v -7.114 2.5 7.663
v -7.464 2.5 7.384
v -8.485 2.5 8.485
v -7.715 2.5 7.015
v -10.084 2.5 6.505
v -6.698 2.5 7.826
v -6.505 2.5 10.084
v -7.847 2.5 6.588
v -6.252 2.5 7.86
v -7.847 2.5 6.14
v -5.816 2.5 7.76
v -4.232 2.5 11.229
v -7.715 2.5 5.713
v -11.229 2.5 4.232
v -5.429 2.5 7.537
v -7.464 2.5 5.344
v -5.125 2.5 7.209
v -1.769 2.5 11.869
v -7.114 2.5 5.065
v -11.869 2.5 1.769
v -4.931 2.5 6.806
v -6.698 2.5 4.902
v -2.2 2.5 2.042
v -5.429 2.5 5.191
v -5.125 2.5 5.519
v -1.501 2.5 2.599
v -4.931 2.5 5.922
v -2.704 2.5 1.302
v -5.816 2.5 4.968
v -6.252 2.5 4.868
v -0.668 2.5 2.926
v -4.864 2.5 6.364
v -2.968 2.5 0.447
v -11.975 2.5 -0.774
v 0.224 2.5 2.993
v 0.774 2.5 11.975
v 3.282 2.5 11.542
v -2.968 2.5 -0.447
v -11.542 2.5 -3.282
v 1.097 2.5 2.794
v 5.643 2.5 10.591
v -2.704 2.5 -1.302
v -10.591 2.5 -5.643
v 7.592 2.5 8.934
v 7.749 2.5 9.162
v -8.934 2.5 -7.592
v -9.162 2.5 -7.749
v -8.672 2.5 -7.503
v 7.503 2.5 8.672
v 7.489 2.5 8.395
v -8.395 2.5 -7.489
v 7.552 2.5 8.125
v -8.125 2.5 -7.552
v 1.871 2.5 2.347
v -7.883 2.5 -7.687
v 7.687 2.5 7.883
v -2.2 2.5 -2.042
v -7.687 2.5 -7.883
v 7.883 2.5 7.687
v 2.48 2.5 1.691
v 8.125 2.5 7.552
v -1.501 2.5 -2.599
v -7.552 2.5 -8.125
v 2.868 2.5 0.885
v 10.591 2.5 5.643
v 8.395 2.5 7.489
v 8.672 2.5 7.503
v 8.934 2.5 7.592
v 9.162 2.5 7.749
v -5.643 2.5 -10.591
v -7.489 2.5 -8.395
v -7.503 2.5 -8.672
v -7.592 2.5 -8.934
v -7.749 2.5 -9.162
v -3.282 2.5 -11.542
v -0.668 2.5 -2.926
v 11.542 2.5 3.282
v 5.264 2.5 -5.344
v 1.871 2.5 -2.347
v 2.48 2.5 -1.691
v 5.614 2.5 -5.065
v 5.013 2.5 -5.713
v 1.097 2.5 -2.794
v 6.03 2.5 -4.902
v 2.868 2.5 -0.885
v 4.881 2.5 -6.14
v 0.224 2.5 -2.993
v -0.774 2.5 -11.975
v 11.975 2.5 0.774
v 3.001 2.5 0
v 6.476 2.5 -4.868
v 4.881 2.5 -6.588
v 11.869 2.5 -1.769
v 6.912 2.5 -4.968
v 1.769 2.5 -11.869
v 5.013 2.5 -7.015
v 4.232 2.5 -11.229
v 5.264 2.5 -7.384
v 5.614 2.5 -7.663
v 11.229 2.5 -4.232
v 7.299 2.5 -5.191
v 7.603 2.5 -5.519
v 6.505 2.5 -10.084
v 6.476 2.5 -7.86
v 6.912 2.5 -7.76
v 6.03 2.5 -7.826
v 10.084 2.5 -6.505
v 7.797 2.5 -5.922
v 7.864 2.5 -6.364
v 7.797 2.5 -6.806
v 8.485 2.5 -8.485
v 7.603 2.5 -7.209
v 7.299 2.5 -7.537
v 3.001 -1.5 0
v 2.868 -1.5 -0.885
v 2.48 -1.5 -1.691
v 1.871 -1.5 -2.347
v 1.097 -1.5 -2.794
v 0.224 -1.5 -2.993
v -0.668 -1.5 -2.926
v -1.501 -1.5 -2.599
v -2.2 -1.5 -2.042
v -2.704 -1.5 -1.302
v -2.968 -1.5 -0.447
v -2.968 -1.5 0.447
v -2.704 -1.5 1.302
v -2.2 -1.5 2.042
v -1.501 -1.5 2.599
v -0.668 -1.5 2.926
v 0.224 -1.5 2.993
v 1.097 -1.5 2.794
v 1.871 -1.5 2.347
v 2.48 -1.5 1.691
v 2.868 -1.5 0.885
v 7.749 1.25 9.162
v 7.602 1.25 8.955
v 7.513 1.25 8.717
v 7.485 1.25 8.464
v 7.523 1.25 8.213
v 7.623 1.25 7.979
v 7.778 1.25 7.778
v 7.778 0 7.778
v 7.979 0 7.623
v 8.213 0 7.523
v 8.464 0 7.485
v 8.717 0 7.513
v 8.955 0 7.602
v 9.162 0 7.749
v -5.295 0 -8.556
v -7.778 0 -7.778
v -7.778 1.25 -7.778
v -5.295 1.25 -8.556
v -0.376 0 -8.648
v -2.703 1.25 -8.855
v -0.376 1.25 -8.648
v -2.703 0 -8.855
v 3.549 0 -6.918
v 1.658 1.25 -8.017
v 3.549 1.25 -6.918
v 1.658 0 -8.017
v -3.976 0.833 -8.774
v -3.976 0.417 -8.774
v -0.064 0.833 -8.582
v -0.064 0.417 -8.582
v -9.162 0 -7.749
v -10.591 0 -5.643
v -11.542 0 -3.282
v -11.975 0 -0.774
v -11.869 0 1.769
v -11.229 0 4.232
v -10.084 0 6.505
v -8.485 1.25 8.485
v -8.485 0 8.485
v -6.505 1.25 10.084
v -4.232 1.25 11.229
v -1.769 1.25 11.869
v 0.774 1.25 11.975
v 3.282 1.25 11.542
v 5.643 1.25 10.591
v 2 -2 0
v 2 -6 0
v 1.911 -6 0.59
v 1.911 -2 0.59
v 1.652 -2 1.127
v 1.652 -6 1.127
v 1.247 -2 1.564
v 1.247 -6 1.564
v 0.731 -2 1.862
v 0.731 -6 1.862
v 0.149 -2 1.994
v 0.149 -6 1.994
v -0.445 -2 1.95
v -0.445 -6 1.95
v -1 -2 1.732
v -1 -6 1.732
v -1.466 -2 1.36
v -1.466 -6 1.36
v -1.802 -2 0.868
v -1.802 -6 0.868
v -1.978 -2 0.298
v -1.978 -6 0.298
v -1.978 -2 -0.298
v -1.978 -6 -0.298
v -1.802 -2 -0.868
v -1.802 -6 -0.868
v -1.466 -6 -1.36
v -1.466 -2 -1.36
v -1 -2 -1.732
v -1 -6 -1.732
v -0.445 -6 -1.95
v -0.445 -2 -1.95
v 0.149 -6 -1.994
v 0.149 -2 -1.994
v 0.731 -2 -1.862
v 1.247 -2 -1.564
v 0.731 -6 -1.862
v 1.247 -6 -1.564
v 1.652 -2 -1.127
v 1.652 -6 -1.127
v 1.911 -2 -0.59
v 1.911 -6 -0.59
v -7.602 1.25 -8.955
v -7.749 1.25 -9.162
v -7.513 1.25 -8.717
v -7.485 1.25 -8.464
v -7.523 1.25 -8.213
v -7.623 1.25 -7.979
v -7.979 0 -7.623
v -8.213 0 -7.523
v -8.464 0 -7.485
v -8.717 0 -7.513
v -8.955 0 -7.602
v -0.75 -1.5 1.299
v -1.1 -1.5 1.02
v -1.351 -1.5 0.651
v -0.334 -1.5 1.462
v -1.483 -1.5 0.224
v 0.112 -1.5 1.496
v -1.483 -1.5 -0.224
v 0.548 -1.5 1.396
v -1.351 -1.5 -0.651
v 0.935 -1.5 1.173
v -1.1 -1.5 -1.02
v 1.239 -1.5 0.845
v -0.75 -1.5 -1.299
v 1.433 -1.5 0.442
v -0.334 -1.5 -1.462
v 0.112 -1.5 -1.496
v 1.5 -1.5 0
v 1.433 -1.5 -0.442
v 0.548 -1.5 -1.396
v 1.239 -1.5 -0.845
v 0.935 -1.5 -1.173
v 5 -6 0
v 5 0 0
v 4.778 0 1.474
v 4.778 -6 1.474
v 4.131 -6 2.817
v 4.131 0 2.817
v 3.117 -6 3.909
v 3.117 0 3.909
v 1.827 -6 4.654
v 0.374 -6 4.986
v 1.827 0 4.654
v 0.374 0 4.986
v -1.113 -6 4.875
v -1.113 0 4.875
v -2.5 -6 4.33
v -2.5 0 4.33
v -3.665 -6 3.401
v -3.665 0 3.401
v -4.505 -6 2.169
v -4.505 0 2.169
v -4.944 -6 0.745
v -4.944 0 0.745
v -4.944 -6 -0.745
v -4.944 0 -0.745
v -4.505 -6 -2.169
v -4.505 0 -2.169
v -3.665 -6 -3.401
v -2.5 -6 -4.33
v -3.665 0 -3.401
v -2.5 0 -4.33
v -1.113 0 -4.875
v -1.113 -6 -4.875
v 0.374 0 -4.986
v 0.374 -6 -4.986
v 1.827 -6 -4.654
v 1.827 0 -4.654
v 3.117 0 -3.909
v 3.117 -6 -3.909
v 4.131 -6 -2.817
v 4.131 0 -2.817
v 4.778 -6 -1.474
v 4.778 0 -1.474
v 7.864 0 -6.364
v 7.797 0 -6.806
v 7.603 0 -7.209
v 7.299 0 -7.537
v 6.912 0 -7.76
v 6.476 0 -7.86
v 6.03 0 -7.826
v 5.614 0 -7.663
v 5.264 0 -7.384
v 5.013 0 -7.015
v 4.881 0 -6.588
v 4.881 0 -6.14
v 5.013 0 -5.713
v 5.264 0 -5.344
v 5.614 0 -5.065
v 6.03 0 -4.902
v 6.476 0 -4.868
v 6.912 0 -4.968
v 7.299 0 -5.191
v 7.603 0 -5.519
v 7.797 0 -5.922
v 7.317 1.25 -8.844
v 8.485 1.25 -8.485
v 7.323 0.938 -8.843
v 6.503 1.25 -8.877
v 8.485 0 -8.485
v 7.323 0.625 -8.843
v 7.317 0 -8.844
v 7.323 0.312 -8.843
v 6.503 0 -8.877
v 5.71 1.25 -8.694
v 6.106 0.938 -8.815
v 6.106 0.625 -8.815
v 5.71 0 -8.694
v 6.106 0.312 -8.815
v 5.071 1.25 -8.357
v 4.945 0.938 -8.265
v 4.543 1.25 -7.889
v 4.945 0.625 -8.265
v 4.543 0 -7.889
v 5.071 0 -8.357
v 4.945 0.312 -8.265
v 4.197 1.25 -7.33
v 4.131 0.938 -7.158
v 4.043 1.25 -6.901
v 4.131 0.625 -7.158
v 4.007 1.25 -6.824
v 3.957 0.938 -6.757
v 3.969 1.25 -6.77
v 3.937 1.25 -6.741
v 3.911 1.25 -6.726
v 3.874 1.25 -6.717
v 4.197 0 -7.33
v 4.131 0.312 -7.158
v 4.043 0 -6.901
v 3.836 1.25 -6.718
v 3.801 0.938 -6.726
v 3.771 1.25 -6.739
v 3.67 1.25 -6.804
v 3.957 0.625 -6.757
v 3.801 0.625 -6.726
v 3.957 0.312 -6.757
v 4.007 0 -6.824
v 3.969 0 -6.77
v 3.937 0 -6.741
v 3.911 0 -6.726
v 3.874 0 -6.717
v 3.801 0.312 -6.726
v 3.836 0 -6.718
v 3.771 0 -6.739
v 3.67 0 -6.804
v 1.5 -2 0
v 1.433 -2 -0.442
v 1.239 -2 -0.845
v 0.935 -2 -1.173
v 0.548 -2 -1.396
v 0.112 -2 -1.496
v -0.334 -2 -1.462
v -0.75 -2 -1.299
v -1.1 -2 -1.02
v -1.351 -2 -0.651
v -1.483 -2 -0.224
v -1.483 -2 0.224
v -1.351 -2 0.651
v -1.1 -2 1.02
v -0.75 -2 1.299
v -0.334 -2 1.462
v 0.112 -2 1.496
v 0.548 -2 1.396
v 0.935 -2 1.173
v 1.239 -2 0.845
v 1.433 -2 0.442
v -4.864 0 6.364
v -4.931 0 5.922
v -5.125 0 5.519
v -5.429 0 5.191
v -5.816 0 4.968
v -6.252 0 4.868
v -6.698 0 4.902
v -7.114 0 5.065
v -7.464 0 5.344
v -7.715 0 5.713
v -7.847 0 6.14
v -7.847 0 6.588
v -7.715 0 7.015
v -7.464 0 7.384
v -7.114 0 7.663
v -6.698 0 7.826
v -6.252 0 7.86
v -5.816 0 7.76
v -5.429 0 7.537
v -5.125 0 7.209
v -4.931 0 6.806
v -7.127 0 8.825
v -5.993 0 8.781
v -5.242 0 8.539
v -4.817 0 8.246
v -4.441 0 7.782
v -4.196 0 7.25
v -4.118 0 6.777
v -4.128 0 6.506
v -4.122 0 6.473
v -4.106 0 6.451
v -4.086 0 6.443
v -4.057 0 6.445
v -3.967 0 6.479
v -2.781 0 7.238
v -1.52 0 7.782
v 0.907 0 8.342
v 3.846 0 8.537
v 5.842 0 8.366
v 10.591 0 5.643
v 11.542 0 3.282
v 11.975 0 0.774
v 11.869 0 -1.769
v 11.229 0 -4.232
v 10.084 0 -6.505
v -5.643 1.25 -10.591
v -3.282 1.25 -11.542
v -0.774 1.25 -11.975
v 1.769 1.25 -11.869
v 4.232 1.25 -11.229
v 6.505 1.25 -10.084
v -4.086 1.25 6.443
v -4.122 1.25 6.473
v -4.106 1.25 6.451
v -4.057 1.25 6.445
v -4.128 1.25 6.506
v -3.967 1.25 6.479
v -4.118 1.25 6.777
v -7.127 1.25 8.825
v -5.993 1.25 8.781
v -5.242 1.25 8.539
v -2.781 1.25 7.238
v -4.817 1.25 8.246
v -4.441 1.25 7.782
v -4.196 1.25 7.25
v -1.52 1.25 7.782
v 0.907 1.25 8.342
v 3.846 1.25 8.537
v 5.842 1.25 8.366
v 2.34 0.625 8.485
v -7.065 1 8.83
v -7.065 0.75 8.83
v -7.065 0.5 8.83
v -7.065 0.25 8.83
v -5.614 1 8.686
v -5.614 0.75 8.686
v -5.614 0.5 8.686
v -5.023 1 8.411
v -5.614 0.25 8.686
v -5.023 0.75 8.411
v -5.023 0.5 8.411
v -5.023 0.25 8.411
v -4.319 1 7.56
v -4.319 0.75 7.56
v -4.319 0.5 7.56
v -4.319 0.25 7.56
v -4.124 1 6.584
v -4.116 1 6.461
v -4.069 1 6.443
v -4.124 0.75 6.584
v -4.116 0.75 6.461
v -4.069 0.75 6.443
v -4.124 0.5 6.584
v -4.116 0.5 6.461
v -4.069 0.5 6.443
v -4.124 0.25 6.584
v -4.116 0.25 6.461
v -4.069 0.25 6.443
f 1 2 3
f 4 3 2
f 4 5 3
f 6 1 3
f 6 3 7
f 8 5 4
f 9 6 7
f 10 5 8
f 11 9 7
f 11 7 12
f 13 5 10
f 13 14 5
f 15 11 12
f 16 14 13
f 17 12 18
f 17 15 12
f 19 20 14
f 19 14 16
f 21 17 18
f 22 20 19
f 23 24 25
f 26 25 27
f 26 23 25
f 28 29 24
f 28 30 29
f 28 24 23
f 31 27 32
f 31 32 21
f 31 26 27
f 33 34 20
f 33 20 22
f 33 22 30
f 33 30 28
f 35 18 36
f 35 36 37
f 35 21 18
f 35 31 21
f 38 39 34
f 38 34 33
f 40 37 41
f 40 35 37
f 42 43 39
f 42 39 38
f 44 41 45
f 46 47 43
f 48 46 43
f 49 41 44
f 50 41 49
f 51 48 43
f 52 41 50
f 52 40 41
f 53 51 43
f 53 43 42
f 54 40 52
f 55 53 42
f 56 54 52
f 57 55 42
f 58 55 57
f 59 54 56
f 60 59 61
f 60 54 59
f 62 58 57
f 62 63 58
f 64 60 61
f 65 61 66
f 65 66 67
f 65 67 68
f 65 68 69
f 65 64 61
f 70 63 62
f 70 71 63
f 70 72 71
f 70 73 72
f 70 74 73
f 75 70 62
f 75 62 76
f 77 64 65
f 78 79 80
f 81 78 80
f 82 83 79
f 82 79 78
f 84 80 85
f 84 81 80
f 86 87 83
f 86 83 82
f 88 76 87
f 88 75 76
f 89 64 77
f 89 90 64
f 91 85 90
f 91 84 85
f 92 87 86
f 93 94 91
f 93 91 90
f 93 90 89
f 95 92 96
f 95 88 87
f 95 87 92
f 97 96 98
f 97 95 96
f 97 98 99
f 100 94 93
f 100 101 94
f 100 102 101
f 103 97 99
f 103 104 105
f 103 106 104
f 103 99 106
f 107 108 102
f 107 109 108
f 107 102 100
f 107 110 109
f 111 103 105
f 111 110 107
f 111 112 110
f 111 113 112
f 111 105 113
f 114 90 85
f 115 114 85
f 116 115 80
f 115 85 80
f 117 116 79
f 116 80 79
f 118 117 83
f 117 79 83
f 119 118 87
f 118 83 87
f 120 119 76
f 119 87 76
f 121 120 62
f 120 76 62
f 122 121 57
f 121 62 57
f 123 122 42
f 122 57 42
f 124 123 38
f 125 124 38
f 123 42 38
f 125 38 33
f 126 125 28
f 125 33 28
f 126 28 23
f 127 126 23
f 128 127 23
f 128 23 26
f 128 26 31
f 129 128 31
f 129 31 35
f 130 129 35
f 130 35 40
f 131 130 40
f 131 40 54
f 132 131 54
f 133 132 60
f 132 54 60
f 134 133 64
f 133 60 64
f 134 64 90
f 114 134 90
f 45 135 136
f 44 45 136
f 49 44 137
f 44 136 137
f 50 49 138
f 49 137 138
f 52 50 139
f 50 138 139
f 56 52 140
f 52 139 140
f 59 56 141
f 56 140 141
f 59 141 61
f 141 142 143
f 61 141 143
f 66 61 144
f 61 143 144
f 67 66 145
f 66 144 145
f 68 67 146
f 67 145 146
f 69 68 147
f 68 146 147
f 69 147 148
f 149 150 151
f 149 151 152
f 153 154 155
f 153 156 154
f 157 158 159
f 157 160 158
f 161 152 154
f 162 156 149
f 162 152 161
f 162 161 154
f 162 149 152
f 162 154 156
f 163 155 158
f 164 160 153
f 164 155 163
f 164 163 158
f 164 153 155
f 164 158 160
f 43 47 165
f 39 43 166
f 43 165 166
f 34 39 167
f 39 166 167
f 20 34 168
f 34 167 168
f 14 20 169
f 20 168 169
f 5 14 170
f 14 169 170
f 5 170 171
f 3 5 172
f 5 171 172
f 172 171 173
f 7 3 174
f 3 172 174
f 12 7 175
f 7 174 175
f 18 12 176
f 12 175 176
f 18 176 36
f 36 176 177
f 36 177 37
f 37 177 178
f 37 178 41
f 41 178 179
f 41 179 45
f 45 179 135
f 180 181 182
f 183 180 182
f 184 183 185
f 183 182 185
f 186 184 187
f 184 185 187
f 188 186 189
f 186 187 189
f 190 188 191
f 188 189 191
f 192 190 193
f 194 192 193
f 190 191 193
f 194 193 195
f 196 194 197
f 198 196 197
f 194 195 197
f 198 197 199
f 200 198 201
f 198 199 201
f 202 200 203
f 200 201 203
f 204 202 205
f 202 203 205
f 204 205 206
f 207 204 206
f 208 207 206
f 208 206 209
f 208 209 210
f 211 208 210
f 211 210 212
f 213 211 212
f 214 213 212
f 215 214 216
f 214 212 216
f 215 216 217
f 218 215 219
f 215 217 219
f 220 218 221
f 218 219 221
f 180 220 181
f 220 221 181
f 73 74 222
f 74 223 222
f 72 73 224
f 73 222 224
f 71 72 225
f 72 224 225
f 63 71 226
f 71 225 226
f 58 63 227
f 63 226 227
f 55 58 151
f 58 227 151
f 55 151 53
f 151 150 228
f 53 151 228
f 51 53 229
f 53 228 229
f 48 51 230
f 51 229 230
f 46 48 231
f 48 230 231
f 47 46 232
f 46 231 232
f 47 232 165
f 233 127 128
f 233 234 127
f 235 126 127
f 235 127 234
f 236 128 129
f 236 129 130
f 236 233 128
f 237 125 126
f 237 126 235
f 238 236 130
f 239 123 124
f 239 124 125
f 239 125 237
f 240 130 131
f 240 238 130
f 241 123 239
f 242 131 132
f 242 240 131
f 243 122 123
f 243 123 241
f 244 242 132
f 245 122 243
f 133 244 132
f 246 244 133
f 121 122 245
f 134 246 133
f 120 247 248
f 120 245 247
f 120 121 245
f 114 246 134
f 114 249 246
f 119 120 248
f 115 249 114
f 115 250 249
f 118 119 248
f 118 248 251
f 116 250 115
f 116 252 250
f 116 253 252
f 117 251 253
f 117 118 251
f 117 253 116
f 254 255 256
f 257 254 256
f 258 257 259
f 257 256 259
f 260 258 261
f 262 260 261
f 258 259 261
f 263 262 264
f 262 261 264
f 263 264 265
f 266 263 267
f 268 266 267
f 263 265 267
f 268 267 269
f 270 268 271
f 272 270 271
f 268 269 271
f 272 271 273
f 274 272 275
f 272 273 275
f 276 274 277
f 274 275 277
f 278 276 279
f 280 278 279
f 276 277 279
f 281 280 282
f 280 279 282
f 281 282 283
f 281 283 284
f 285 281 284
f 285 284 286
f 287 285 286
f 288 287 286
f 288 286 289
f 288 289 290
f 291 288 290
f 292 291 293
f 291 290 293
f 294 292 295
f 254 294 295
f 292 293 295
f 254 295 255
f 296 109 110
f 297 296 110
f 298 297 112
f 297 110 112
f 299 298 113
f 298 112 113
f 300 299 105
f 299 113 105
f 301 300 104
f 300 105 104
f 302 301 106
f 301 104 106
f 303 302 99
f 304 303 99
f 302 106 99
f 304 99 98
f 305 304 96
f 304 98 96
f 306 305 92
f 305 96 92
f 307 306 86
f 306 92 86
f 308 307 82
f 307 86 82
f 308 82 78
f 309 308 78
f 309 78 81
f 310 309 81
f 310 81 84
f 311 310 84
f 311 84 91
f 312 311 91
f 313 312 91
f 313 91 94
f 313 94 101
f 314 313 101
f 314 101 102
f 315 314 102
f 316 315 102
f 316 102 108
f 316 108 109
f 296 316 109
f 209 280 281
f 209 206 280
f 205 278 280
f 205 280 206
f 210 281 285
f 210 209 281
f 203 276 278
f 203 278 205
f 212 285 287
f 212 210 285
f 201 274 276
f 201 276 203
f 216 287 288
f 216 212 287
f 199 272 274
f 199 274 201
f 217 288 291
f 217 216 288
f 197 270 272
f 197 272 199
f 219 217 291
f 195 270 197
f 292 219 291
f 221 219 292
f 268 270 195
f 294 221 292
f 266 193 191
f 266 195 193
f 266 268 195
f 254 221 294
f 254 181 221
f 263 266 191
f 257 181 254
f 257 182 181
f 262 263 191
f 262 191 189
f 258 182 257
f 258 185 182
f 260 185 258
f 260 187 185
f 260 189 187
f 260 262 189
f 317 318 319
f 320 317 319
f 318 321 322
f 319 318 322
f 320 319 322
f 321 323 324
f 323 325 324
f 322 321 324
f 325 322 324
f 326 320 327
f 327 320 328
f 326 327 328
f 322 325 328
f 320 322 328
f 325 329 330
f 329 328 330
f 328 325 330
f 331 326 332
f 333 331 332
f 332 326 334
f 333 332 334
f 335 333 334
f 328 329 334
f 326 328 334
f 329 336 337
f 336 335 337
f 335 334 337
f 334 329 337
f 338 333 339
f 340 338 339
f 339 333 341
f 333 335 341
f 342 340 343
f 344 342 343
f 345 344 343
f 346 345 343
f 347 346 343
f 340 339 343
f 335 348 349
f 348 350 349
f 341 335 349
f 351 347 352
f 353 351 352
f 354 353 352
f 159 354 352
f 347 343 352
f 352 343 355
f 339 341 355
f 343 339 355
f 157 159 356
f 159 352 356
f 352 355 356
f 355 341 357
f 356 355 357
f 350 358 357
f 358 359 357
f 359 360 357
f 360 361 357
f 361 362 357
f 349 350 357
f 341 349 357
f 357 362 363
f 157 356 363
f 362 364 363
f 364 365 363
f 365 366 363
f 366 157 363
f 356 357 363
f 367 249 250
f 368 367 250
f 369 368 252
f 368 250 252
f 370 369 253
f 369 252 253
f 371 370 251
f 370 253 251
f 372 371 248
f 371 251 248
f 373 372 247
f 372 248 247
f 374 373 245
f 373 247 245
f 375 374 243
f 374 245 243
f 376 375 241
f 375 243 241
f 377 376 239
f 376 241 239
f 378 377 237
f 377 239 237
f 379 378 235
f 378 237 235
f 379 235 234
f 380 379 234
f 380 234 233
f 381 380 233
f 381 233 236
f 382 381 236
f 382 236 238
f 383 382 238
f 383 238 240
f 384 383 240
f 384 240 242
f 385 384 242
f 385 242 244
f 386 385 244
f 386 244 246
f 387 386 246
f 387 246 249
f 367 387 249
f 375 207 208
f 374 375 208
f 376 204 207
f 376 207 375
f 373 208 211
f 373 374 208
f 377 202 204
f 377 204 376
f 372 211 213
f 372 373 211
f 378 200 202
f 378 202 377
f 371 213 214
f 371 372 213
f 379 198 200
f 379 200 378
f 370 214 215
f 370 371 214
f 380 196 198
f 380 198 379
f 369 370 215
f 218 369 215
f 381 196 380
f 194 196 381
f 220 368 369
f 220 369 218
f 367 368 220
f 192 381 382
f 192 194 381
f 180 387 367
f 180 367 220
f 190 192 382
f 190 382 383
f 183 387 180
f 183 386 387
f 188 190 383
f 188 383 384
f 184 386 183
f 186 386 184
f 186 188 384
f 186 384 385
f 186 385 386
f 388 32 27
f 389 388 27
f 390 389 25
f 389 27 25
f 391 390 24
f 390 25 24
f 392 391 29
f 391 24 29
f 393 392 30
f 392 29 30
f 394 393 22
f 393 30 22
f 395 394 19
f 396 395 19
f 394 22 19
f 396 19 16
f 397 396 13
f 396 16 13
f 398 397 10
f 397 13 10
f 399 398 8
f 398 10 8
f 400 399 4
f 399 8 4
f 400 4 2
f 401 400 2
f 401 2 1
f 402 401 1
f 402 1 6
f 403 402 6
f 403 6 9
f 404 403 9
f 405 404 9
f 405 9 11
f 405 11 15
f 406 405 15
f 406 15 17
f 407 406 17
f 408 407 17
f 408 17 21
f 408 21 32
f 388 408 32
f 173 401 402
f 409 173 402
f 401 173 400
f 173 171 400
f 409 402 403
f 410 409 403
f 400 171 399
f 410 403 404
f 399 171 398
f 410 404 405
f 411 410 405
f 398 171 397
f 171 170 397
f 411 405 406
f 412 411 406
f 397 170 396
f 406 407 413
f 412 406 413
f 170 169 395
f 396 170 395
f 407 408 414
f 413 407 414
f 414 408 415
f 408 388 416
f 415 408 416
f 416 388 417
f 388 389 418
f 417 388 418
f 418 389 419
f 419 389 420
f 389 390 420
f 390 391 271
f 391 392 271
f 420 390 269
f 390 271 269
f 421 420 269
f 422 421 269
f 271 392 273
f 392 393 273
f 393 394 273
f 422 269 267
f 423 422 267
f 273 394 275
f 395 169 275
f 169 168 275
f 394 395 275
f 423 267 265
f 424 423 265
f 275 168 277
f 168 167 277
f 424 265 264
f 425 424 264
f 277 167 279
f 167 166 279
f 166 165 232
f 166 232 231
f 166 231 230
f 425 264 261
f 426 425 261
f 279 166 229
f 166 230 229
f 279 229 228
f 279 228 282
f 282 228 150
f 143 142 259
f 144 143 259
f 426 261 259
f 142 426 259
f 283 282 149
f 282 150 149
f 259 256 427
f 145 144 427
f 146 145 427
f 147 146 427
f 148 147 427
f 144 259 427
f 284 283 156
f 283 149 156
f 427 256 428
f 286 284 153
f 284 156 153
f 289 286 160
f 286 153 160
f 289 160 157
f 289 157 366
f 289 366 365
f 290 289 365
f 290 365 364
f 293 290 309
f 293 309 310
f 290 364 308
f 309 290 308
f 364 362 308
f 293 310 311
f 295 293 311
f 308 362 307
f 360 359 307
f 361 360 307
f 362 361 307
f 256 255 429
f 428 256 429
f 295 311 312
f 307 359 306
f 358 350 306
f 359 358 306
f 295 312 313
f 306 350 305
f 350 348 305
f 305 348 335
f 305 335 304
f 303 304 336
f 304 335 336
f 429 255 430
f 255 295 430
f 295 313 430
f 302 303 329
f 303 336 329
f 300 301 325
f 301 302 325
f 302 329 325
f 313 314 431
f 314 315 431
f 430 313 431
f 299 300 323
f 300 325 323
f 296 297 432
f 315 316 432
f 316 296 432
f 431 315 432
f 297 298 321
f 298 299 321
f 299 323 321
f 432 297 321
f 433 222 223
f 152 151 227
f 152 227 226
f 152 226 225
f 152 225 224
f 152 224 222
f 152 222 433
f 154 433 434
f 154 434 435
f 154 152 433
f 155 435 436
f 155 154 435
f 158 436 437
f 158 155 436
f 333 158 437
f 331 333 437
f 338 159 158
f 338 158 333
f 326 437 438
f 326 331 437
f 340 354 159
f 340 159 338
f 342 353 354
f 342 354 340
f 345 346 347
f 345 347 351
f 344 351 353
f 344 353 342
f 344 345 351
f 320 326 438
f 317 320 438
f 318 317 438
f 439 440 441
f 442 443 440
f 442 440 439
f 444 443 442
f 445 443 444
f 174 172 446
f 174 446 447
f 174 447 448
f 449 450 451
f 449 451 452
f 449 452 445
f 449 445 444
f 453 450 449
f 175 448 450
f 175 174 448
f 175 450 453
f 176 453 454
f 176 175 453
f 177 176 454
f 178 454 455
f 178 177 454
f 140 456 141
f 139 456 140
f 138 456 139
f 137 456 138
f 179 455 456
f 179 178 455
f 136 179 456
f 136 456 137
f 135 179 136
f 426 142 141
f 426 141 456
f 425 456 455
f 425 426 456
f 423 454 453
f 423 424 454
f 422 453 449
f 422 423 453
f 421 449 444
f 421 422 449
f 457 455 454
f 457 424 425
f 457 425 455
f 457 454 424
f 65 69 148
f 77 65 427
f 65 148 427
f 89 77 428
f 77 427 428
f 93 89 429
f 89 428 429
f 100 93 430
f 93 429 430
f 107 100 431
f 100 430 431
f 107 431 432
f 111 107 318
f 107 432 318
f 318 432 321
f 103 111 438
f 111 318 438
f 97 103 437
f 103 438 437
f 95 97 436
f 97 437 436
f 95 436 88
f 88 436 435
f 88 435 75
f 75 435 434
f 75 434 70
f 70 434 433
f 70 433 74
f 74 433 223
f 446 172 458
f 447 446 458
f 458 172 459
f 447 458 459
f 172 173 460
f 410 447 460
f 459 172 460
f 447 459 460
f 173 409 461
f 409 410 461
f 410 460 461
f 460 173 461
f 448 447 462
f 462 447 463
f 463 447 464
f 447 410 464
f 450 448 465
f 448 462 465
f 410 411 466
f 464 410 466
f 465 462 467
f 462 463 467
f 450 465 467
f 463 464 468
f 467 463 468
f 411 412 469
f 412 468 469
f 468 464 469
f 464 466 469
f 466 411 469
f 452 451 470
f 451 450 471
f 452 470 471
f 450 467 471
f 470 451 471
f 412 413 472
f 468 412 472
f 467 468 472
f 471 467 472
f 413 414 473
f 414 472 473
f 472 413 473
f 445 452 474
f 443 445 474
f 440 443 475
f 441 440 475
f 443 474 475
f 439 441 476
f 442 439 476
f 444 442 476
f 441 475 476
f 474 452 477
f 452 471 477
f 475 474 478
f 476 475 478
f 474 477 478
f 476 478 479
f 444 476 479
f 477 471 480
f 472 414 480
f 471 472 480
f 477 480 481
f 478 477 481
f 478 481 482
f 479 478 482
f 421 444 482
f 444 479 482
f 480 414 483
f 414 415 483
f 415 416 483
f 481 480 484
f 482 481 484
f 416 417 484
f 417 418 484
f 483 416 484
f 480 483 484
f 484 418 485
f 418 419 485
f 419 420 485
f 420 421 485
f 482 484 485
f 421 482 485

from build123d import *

# Parameters (mm, degrees)
CROQUIS1_R              = 12
SALIENTE_EXTRUIR1_DEPTH = 2.5
CROQUIS3_R              = 5
SALIENTE_EXTRUIR2_DEPTH = 6
CROQUIS2_R              = 3.001453564
CORTAR_EXTRUIR1_DEPTH   = 4
CROQUIS4_R              = 1.5
CORTAR_EXTRUIR2_DEPTH   = 8
CROQUIS5_R              = 2
CORTAR_EXTRUIR6_DEPTH   = 4
CROQUIS6_R              = 1.5
CORTAR_EXTRUIR7_DEPTH   = 4
CROQUIS7_R              = 1
CORTAR_EXTRUIR8_DEPTH   = 4
CORTAR_EXTRUIR9_DEPTH   = 1.25


with BuildPart() as part:
    # Croquis1 → Saliente-Extruir1 (new body)
    with BuildSketch(Plane(origin=(0, 0, 0), x_dir=(1, 0, 0), z_dir=(0, 1, 0))):
        Circle(CROQUIS1_R)
    extrude(amount=SALIENTE_EXTRUIR1_DEPTH)

    # Croquis3 → Saliente-Extruir2 (add)
    with BuildSketch(Plane.XZ):
        Circle(CROQUIS3_R)
    extrude(amount=SALIENTE_EXTRUIR2_DEPTH)

    # Croquis2 → Cortar-Extruir1 (cut)
    with BuildSketch(Plane(origin=(0, 2.5, 0), x_dir=(1, 0, 0), z_dir=(0, 1, 0))):
        Circle(CROQUIS2_R)
    extrude(amount=-CORTAR_EXTRUIR1_DEPTH, mode=Mode.SUBTRACT)

    # Croquis4 → Cortar-Extruir2 (cut)
    with BuildSketch(Plane(origin=(0, -1.5, 0), x_dir=(1, 0, 0), z_dir=(0, 1, 0))):
        Circle(CROQUIS4_R)
    extrude(amount=-CORTAR_EXTRUIR2_DEPTH, mode=Mode.SUBTRACT)

    # Croquis5 → Cortar-Extruir6 (cut)
    with BuildSketch(Plane.XZ.offset(6)):
        Circle(CROQUIS5_R)
    extrude(amount=-CORTAR_EXTRUIR6_DEPTH, mode=Mode.SUBTRACT)

    # Croquis6 → Cortar-Extruir7 (cut)
    with BuildSketch(Plane(origin=(0, 2.5, 0), x_dir=(1, 0, 0), z_dir=(0, 1, 0))):
        with Locations((6.363961031, 6.363961031)):
            Circle(CROQUIS6_R)
        with Locations((-6.363961031, -6.363961031)):
            Circle(CROQUIS6_R)
    extrude(amount=-CORTAR_EXTRUIR7_DEPTH, mode=Mode.SUBTRACT)

    # Croquis7 → Cortar-Extruir8 (cut)
    with BuildSketch(Plane.XZ):
        with Locations((8.485281374, 8.485281374)):
            Circle(CROQUIS7_R)
        with Locations((-8.485281374, -8.485281374)):
            Circle(CROQUIS7_R)
    extrude(amount=-CORTAR_EXTRUIR8_DEPTH, mode=Mode.SUBTRACT)

    # Croquis8 → Cortar-Extruir9 (cut)
    with BuildSketch(Plane.XZ):
        with BuildLine():
            ThreePointArc((7.778174593, 7.778174593), (7.485498506, 8.464443516), (7.749325885, 9.162311298))
            ThreePointArc((7.749325885, 9.162311298), (-0.5, 11.989578808), (-8.485281374, 8.485281374))
            add(Edge.make_bspline(
                [(-8.485281374, 8.485281374), (-7.592740334, 8.845120344), (-6.313852411, 9.008442263), (-4.858999126, 8.387047865), (-4.264313018, 7.608507158), (-4.072837383, 6.86756437), (-4.147476561, 6.387348921), (-3.967074672, 6.478559767)],
                knots=[0, 0, 0, 0, 0.492098519, 0.601947317, 0.788100157, 0.955757021, 1, 1, 1, 1], degree=3))
            add(Edge.make_bspline(
                [(7.778174593, 7.778174593), (6.043762471, 8.553284771), (1.93848679, 8.683425804), (-2.11467577, 7.905967318), (-3.967074672, 6.478559767)],
                knots=[0, 0, 0, 0, 0.452400817, 1, 1, 1, 1], degree=3))
        make_face()
        with BuildLine():
            ThreePointArc((-7.749325885, -9.162311298), (0.5, -11.989578808), (8.485281374, -8.485281374))
            add(Edge.make_bspline(
                [(8.485281374, -8.485281374), (7.761300195, -8.818220731), (6.448317824, -9.091275119), (4.851033429, -8.31231131), (4.115527792, -7.425847437), (3.966487119, -6.478710331), (3.548635711, -6.917914395)],
                knots=[0, 0, 0, 0, 0.407620337, 0.622914437, 0.853292729, 1, 1, 1, 1], degree=3))
            add(Edge.make_bspline(
                [(-7.778174593, -7.778174593), (-4.168772685, -9.273462944), (0.223344673, -9.411626111), (3.548635711, -6.917914395)],
                knots=[0, 0, 0, 0, 1, 1, 1, 1], degree=3))
            ThreePointArc((-7.778174593, -7.778174593), (-7.485498506, -8.464443516), (-7.749325885, -9.162311298))
        make_face()
    extrude(amount=-CORTAR_EXTRUIR9_DEPTH, mode=Mode.SUBTRACT)


solid = part.part
